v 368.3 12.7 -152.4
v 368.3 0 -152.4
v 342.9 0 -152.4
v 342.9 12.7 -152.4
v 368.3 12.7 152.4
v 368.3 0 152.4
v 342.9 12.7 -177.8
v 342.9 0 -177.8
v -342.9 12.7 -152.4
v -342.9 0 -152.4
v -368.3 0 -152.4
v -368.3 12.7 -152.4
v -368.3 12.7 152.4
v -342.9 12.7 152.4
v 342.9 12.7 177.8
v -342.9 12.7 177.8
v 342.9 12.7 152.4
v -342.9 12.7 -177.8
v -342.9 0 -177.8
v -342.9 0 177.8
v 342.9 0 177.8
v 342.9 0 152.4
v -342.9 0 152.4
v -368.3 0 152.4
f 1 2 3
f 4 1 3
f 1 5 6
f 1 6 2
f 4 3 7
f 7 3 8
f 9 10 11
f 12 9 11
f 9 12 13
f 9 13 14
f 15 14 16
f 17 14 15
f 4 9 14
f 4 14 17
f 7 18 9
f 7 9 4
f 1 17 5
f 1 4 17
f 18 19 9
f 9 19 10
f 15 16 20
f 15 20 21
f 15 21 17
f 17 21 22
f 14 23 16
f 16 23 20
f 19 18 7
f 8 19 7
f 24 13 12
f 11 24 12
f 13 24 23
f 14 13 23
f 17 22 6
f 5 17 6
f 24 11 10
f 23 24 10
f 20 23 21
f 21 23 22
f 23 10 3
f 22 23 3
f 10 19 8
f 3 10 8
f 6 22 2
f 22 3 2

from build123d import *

# Parameters (mm, degrees)
BOSS_EXTRUDE1_DEPTH = 12.7
SKETCH2_W           = 12.7
SKETCH2_H           = 304.8
SKETCH2_W_2         = 685.8
SKETCH2_H_2         = 12.7
CUT_EXTRUDE1_DEPTH  = 12.7


with BuildPart() as part:
    # Sketch1 → Boss-Extrude1 (new body)
    with BuildSketch(Plane(origin=(0, 0, 0), x_dir=(1, 0, 0), z_dir=(0, 1, 0))):
        Polygon((342.9, 190.5), (-342.9, 190.5), (-342.9, 152.4), (-381, 152.4), (-381, -152.4), (-342.9, -152.4), (-342.9, -190.5), (342.9, -190.5), (342.9, -152.4), (381, -152.4), (381, 152.4), (342.9, 152.4), align=None)
    extrude(amount=BOSS_EXTRUDE1_DEPTH)

    # Sketch2 → Cut-Extrude1 (cut)
    with BuildSketch(Plane(origin=(0, 12.7, 0), x_dir=(1, 0, 0), z_dir=(0, 1, 0))):
        with Locations((-374.65, 0)):
            Rectangle(SKETCH2_W, SKETCH2_H)
        with Locations((0, 184.15)):
            Rectangle(SKETCH2_W_2, SKETCH2_H_2)
        with Locations((374.65, 0)):
            Rectangle(SKETCH2_W, SKETCH2_H)
        with Locations((0, -184.15)):
            Rectangle(SKETCH2_W_2, SKETCH2_H_2)
    extrude(amount=-CUT_EXTRUDE1_DEPTH, mode=Mode.SUBTRACT)


solid = part.part
